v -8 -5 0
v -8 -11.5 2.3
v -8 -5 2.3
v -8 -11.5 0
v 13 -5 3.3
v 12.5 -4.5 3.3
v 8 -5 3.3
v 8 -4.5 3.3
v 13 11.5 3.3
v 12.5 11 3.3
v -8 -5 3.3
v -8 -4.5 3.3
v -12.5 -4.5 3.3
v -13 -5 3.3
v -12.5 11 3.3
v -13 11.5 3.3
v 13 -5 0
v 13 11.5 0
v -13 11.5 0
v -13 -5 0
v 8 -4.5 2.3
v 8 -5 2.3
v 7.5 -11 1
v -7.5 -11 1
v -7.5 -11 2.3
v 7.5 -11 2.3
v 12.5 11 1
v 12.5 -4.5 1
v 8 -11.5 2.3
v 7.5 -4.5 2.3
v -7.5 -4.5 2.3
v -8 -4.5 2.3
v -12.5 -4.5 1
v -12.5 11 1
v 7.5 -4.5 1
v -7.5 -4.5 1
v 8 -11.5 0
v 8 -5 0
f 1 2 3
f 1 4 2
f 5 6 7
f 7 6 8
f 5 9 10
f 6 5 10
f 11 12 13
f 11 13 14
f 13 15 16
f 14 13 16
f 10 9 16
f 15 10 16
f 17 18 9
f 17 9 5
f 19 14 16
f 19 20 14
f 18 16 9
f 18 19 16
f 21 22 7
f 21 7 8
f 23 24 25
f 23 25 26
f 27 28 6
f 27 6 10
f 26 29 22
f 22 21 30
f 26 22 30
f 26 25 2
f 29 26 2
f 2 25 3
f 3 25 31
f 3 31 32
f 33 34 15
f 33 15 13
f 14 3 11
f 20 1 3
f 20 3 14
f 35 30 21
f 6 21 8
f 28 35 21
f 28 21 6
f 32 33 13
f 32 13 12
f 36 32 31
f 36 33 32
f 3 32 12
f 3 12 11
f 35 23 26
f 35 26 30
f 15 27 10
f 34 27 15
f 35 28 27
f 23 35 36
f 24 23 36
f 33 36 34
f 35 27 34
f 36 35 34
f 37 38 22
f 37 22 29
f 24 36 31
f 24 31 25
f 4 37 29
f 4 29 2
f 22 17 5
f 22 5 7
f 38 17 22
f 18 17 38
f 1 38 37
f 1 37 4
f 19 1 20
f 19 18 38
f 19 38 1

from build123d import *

# Parameters (mm, degrees)
PAD_DEPTH    = 1
PAD001_DEPTH = 1.3
PAD002_DEPTH = 1


with BuildPart() as part:
    # Sketch → Pad (new body)
    with BuildSketch(Plane.XY):
        Polygon((-13, 11.5), (13, 11.5), (13, -5), (8, -5), (8, -11.5), (-8, -11.5), (-8, -5), (-13, -5), align=None)
    extrude(amount=PAD_DEPTH)

    # Sketch001 (on DatumPlane) → Pad001 (join)
    with BuildSketch(Plane.XY.offset(1)):
        Polygon((-13, 11.5), (13, 11.5), (13, -5), (8, -5), (8, -11.5), (-8, -11.5), (-8, -5), (-13, -5), align=None)
        Polygon((-12.5, 11), (-12.5, -4.5), (-7.5, -4.5), (-7.5, -11), (7.5, -11), (7.5, -4.5), (12.5, -4.5), (12.5, 11), align=None, mode=Mode.SUBTRACT)
    extrude(amount=PAD001_DEPTH)

    # Sketch002 (on Face13 of Pad001) → Pad002 (join)
    with BuildSketch(Plane.XY.offset(2.3)):
        Polygon((-13, 11.5), (13, 11.5), (13, -5), (8, -5), (8, -4.5), (12.5, -4.5), (12.5, 11), (-12.5, 11), (-12.5, -4.5), (-8, -4.5), (-8, -5), (-13, -5), align=None)
    extrude(amount=PAD002_DEPTH)


solid = part.part
